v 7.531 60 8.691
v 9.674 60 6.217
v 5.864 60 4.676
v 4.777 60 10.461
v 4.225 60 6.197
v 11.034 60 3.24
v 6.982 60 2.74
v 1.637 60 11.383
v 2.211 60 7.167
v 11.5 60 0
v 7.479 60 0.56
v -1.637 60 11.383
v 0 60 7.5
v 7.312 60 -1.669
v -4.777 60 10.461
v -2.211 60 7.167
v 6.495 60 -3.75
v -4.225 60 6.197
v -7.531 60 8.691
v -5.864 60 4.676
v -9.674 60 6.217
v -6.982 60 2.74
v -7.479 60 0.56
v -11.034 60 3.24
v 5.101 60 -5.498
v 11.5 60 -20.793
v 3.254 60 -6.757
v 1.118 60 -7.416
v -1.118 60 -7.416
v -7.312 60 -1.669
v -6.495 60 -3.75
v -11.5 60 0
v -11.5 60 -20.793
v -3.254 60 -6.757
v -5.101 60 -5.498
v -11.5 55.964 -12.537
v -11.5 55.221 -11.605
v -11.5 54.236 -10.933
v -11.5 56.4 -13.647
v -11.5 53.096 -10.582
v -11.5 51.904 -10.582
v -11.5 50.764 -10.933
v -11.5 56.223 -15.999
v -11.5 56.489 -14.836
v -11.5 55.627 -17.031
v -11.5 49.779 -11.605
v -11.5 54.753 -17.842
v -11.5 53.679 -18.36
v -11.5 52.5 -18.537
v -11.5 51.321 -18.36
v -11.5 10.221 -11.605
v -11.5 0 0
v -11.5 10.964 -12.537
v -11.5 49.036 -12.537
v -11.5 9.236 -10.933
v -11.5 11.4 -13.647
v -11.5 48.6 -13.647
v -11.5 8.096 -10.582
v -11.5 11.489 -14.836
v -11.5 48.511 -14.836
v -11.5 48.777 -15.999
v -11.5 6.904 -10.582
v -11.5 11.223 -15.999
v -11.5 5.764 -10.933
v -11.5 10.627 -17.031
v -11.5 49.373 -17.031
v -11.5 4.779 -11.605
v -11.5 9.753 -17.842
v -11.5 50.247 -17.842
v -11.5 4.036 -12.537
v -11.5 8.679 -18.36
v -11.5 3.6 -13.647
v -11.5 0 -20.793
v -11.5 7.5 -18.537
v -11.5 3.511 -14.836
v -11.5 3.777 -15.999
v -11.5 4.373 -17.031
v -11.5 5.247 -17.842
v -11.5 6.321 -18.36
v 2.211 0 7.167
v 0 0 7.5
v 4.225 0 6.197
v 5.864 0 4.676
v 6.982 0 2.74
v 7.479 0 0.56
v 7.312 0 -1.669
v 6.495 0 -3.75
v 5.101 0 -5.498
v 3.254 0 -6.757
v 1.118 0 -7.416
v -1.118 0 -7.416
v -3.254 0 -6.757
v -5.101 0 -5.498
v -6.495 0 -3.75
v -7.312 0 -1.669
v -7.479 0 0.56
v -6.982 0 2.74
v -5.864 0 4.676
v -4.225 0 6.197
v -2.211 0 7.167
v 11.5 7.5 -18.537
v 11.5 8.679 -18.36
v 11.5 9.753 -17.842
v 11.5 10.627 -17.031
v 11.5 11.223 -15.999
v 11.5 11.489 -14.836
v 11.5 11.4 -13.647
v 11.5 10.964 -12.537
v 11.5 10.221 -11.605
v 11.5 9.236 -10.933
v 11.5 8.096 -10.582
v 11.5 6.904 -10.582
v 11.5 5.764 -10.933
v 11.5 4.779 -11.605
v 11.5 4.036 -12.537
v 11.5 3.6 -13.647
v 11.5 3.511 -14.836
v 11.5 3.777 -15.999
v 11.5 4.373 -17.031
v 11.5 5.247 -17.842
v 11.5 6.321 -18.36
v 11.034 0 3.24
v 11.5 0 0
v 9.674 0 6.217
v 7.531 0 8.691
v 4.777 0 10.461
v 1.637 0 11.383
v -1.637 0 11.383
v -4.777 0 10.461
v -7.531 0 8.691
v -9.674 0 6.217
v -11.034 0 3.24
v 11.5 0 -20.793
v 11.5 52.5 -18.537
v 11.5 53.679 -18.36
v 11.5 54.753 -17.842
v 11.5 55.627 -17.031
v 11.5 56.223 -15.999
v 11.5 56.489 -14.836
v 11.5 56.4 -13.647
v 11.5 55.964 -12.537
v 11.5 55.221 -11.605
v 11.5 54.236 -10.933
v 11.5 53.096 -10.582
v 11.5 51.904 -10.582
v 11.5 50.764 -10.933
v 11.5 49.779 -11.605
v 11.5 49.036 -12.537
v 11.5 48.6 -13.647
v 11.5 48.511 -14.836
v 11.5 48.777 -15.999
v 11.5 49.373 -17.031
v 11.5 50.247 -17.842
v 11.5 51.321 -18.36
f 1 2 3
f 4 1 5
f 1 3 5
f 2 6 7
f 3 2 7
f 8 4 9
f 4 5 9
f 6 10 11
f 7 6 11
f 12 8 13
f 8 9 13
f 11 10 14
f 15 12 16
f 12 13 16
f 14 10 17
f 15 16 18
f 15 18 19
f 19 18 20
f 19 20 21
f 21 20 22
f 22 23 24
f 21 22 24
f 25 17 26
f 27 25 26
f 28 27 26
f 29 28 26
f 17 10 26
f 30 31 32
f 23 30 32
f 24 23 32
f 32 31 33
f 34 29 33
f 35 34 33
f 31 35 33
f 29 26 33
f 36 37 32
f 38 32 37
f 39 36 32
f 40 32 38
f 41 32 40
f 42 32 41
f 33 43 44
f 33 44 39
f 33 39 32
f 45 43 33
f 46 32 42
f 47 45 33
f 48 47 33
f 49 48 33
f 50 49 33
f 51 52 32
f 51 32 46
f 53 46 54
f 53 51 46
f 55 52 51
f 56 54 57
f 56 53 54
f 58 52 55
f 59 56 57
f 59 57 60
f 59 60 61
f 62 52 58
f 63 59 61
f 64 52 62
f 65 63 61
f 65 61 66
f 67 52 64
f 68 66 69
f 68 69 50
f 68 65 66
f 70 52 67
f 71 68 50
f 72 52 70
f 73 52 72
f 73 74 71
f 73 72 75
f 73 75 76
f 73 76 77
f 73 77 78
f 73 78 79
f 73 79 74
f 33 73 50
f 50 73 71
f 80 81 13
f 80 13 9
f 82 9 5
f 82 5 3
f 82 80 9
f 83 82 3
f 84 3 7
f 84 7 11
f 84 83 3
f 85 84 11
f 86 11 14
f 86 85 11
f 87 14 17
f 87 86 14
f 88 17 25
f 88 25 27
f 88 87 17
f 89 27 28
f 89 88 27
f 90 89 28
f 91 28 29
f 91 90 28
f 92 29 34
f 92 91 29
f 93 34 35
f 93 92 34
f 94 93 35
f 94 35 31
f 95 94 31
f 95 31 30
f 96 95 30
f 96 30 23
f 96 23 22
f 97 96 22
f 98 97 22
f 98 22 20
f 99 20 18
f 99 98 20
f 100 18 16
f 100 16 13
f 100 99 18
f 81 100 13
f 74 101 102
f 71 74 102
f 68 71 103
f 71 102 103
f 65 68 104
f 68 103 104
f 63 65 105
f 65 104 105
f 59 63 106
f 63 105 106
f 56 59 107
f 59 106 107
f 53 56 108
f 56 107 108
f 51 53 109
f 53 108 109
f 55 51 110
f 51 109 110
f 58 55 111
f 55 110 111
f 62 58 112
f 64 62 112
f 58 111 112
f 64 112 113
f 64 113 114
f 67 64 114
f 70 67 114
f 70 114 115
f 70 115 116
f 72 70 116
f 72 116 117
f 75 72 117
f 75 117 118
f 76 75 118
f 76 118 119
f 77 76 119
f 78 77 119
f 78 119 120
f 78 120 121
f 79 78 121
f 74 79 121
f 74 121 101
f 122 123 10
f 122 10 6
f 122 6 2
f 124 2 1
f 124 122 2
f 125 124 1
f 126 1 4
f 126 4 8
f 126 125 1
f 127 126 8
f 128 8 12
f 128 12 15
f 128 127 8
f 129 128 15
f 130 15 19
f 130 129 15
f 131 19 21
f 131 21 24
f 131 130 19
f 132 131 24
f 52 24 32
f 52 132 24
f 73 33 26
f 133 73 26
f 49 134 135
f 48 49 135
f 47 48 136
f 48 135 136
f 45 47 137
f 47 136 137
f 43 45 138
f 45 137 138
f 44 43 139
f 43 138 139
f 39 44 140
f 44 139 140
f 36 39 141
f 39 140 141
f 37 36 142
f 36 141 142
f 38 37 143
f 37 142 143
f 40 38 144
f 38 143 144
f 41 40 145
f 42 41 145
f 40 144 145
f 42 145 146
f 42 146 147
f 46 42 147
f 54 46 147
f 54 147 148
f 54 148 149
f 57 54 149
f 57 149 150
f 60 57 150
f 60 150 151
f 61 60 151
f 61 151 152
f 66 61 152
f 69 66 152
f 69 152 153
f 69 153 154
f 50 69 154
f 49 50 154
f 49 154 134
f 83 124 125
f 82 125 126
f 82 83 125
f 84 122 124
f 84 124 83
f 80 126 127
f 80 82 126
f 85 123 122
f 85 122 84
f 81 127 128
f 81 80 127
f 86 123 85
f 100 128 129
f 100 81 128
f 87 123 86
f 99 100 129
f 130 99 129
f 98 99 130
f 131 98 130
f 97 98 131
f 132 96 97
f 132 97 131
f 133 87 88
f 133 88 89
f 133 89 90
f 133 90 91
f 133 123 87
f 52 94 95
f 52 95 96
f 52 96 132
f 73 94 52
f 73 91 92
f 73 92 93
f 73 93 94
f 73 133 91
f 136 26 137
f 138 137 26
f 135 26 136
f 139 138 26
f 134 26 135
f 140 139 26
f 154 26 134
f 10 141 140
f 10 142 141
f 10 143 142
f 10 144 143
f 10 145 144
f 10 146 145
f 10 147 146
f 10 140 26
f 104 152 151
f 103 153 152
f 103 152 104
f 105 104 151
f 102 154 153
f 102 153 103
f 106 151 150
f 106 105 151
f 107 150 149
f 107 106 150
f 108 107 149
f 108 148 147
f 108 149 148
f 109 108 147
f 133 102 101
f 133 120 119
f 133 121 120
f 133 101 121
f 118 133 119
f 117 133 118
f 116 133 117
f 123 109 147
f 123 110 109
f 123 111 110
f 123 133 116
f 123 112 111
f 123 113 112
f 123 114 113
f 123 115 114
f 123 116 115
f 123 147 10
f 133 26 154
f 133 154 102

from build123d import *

# Parameters (mm, degrees)
SKETCH1_R           = 7.5
BOSS_EXTRUDE1_DEPTH = 60
SKETCH2_R           = 4
CUT_EXTRUDE1_DEPTH  = 50


with BuildPart() as part:
    # Sketch1 → Boss-Extrude1 (new body)
    with BuildSketch(Plane(origin=(0, 0, 0), x_dir=(1, 0, 0), z_dir=(0, 1, 0))):
        with BuildLine():
            Line((-11.5, 0), (-11.5, 20.793359223))
            Line((-11.5, 20.793359223), (11.5, 20.793359223))
            Line((11.5, 20.793359223), (11.5, 0))
            ThreePointArc((11.5, 0), (0, -11.5), (-11.5, 0))
        make_face()
        with Locations(Location((0, 0, 0), (0, 0, 270))):
            Circle(SKETCH1_R, mode=Mode.SUBTRACT)
    extrude(amount=BOSS_EXTRUDE1_DEPTH)

    # Sketch2 → Cut-Extrude1 (cut)
    with BuildSketch(Plane(origin=(11.5, 0, 0), x_dir=(0, 0, -1), z_dir=(1, 0, 0))):
        with Locations((14.537325079, 52.5)):
            Circle(SKETCH2_R)
        with Locations((14.537325079, 7.5)):
            Circle(SKETCH2_R)
    extrude(amount=-CUT_EXTRUDE1_DEPTH, mode=Mode.SUBTRACT)


solid = part.part
